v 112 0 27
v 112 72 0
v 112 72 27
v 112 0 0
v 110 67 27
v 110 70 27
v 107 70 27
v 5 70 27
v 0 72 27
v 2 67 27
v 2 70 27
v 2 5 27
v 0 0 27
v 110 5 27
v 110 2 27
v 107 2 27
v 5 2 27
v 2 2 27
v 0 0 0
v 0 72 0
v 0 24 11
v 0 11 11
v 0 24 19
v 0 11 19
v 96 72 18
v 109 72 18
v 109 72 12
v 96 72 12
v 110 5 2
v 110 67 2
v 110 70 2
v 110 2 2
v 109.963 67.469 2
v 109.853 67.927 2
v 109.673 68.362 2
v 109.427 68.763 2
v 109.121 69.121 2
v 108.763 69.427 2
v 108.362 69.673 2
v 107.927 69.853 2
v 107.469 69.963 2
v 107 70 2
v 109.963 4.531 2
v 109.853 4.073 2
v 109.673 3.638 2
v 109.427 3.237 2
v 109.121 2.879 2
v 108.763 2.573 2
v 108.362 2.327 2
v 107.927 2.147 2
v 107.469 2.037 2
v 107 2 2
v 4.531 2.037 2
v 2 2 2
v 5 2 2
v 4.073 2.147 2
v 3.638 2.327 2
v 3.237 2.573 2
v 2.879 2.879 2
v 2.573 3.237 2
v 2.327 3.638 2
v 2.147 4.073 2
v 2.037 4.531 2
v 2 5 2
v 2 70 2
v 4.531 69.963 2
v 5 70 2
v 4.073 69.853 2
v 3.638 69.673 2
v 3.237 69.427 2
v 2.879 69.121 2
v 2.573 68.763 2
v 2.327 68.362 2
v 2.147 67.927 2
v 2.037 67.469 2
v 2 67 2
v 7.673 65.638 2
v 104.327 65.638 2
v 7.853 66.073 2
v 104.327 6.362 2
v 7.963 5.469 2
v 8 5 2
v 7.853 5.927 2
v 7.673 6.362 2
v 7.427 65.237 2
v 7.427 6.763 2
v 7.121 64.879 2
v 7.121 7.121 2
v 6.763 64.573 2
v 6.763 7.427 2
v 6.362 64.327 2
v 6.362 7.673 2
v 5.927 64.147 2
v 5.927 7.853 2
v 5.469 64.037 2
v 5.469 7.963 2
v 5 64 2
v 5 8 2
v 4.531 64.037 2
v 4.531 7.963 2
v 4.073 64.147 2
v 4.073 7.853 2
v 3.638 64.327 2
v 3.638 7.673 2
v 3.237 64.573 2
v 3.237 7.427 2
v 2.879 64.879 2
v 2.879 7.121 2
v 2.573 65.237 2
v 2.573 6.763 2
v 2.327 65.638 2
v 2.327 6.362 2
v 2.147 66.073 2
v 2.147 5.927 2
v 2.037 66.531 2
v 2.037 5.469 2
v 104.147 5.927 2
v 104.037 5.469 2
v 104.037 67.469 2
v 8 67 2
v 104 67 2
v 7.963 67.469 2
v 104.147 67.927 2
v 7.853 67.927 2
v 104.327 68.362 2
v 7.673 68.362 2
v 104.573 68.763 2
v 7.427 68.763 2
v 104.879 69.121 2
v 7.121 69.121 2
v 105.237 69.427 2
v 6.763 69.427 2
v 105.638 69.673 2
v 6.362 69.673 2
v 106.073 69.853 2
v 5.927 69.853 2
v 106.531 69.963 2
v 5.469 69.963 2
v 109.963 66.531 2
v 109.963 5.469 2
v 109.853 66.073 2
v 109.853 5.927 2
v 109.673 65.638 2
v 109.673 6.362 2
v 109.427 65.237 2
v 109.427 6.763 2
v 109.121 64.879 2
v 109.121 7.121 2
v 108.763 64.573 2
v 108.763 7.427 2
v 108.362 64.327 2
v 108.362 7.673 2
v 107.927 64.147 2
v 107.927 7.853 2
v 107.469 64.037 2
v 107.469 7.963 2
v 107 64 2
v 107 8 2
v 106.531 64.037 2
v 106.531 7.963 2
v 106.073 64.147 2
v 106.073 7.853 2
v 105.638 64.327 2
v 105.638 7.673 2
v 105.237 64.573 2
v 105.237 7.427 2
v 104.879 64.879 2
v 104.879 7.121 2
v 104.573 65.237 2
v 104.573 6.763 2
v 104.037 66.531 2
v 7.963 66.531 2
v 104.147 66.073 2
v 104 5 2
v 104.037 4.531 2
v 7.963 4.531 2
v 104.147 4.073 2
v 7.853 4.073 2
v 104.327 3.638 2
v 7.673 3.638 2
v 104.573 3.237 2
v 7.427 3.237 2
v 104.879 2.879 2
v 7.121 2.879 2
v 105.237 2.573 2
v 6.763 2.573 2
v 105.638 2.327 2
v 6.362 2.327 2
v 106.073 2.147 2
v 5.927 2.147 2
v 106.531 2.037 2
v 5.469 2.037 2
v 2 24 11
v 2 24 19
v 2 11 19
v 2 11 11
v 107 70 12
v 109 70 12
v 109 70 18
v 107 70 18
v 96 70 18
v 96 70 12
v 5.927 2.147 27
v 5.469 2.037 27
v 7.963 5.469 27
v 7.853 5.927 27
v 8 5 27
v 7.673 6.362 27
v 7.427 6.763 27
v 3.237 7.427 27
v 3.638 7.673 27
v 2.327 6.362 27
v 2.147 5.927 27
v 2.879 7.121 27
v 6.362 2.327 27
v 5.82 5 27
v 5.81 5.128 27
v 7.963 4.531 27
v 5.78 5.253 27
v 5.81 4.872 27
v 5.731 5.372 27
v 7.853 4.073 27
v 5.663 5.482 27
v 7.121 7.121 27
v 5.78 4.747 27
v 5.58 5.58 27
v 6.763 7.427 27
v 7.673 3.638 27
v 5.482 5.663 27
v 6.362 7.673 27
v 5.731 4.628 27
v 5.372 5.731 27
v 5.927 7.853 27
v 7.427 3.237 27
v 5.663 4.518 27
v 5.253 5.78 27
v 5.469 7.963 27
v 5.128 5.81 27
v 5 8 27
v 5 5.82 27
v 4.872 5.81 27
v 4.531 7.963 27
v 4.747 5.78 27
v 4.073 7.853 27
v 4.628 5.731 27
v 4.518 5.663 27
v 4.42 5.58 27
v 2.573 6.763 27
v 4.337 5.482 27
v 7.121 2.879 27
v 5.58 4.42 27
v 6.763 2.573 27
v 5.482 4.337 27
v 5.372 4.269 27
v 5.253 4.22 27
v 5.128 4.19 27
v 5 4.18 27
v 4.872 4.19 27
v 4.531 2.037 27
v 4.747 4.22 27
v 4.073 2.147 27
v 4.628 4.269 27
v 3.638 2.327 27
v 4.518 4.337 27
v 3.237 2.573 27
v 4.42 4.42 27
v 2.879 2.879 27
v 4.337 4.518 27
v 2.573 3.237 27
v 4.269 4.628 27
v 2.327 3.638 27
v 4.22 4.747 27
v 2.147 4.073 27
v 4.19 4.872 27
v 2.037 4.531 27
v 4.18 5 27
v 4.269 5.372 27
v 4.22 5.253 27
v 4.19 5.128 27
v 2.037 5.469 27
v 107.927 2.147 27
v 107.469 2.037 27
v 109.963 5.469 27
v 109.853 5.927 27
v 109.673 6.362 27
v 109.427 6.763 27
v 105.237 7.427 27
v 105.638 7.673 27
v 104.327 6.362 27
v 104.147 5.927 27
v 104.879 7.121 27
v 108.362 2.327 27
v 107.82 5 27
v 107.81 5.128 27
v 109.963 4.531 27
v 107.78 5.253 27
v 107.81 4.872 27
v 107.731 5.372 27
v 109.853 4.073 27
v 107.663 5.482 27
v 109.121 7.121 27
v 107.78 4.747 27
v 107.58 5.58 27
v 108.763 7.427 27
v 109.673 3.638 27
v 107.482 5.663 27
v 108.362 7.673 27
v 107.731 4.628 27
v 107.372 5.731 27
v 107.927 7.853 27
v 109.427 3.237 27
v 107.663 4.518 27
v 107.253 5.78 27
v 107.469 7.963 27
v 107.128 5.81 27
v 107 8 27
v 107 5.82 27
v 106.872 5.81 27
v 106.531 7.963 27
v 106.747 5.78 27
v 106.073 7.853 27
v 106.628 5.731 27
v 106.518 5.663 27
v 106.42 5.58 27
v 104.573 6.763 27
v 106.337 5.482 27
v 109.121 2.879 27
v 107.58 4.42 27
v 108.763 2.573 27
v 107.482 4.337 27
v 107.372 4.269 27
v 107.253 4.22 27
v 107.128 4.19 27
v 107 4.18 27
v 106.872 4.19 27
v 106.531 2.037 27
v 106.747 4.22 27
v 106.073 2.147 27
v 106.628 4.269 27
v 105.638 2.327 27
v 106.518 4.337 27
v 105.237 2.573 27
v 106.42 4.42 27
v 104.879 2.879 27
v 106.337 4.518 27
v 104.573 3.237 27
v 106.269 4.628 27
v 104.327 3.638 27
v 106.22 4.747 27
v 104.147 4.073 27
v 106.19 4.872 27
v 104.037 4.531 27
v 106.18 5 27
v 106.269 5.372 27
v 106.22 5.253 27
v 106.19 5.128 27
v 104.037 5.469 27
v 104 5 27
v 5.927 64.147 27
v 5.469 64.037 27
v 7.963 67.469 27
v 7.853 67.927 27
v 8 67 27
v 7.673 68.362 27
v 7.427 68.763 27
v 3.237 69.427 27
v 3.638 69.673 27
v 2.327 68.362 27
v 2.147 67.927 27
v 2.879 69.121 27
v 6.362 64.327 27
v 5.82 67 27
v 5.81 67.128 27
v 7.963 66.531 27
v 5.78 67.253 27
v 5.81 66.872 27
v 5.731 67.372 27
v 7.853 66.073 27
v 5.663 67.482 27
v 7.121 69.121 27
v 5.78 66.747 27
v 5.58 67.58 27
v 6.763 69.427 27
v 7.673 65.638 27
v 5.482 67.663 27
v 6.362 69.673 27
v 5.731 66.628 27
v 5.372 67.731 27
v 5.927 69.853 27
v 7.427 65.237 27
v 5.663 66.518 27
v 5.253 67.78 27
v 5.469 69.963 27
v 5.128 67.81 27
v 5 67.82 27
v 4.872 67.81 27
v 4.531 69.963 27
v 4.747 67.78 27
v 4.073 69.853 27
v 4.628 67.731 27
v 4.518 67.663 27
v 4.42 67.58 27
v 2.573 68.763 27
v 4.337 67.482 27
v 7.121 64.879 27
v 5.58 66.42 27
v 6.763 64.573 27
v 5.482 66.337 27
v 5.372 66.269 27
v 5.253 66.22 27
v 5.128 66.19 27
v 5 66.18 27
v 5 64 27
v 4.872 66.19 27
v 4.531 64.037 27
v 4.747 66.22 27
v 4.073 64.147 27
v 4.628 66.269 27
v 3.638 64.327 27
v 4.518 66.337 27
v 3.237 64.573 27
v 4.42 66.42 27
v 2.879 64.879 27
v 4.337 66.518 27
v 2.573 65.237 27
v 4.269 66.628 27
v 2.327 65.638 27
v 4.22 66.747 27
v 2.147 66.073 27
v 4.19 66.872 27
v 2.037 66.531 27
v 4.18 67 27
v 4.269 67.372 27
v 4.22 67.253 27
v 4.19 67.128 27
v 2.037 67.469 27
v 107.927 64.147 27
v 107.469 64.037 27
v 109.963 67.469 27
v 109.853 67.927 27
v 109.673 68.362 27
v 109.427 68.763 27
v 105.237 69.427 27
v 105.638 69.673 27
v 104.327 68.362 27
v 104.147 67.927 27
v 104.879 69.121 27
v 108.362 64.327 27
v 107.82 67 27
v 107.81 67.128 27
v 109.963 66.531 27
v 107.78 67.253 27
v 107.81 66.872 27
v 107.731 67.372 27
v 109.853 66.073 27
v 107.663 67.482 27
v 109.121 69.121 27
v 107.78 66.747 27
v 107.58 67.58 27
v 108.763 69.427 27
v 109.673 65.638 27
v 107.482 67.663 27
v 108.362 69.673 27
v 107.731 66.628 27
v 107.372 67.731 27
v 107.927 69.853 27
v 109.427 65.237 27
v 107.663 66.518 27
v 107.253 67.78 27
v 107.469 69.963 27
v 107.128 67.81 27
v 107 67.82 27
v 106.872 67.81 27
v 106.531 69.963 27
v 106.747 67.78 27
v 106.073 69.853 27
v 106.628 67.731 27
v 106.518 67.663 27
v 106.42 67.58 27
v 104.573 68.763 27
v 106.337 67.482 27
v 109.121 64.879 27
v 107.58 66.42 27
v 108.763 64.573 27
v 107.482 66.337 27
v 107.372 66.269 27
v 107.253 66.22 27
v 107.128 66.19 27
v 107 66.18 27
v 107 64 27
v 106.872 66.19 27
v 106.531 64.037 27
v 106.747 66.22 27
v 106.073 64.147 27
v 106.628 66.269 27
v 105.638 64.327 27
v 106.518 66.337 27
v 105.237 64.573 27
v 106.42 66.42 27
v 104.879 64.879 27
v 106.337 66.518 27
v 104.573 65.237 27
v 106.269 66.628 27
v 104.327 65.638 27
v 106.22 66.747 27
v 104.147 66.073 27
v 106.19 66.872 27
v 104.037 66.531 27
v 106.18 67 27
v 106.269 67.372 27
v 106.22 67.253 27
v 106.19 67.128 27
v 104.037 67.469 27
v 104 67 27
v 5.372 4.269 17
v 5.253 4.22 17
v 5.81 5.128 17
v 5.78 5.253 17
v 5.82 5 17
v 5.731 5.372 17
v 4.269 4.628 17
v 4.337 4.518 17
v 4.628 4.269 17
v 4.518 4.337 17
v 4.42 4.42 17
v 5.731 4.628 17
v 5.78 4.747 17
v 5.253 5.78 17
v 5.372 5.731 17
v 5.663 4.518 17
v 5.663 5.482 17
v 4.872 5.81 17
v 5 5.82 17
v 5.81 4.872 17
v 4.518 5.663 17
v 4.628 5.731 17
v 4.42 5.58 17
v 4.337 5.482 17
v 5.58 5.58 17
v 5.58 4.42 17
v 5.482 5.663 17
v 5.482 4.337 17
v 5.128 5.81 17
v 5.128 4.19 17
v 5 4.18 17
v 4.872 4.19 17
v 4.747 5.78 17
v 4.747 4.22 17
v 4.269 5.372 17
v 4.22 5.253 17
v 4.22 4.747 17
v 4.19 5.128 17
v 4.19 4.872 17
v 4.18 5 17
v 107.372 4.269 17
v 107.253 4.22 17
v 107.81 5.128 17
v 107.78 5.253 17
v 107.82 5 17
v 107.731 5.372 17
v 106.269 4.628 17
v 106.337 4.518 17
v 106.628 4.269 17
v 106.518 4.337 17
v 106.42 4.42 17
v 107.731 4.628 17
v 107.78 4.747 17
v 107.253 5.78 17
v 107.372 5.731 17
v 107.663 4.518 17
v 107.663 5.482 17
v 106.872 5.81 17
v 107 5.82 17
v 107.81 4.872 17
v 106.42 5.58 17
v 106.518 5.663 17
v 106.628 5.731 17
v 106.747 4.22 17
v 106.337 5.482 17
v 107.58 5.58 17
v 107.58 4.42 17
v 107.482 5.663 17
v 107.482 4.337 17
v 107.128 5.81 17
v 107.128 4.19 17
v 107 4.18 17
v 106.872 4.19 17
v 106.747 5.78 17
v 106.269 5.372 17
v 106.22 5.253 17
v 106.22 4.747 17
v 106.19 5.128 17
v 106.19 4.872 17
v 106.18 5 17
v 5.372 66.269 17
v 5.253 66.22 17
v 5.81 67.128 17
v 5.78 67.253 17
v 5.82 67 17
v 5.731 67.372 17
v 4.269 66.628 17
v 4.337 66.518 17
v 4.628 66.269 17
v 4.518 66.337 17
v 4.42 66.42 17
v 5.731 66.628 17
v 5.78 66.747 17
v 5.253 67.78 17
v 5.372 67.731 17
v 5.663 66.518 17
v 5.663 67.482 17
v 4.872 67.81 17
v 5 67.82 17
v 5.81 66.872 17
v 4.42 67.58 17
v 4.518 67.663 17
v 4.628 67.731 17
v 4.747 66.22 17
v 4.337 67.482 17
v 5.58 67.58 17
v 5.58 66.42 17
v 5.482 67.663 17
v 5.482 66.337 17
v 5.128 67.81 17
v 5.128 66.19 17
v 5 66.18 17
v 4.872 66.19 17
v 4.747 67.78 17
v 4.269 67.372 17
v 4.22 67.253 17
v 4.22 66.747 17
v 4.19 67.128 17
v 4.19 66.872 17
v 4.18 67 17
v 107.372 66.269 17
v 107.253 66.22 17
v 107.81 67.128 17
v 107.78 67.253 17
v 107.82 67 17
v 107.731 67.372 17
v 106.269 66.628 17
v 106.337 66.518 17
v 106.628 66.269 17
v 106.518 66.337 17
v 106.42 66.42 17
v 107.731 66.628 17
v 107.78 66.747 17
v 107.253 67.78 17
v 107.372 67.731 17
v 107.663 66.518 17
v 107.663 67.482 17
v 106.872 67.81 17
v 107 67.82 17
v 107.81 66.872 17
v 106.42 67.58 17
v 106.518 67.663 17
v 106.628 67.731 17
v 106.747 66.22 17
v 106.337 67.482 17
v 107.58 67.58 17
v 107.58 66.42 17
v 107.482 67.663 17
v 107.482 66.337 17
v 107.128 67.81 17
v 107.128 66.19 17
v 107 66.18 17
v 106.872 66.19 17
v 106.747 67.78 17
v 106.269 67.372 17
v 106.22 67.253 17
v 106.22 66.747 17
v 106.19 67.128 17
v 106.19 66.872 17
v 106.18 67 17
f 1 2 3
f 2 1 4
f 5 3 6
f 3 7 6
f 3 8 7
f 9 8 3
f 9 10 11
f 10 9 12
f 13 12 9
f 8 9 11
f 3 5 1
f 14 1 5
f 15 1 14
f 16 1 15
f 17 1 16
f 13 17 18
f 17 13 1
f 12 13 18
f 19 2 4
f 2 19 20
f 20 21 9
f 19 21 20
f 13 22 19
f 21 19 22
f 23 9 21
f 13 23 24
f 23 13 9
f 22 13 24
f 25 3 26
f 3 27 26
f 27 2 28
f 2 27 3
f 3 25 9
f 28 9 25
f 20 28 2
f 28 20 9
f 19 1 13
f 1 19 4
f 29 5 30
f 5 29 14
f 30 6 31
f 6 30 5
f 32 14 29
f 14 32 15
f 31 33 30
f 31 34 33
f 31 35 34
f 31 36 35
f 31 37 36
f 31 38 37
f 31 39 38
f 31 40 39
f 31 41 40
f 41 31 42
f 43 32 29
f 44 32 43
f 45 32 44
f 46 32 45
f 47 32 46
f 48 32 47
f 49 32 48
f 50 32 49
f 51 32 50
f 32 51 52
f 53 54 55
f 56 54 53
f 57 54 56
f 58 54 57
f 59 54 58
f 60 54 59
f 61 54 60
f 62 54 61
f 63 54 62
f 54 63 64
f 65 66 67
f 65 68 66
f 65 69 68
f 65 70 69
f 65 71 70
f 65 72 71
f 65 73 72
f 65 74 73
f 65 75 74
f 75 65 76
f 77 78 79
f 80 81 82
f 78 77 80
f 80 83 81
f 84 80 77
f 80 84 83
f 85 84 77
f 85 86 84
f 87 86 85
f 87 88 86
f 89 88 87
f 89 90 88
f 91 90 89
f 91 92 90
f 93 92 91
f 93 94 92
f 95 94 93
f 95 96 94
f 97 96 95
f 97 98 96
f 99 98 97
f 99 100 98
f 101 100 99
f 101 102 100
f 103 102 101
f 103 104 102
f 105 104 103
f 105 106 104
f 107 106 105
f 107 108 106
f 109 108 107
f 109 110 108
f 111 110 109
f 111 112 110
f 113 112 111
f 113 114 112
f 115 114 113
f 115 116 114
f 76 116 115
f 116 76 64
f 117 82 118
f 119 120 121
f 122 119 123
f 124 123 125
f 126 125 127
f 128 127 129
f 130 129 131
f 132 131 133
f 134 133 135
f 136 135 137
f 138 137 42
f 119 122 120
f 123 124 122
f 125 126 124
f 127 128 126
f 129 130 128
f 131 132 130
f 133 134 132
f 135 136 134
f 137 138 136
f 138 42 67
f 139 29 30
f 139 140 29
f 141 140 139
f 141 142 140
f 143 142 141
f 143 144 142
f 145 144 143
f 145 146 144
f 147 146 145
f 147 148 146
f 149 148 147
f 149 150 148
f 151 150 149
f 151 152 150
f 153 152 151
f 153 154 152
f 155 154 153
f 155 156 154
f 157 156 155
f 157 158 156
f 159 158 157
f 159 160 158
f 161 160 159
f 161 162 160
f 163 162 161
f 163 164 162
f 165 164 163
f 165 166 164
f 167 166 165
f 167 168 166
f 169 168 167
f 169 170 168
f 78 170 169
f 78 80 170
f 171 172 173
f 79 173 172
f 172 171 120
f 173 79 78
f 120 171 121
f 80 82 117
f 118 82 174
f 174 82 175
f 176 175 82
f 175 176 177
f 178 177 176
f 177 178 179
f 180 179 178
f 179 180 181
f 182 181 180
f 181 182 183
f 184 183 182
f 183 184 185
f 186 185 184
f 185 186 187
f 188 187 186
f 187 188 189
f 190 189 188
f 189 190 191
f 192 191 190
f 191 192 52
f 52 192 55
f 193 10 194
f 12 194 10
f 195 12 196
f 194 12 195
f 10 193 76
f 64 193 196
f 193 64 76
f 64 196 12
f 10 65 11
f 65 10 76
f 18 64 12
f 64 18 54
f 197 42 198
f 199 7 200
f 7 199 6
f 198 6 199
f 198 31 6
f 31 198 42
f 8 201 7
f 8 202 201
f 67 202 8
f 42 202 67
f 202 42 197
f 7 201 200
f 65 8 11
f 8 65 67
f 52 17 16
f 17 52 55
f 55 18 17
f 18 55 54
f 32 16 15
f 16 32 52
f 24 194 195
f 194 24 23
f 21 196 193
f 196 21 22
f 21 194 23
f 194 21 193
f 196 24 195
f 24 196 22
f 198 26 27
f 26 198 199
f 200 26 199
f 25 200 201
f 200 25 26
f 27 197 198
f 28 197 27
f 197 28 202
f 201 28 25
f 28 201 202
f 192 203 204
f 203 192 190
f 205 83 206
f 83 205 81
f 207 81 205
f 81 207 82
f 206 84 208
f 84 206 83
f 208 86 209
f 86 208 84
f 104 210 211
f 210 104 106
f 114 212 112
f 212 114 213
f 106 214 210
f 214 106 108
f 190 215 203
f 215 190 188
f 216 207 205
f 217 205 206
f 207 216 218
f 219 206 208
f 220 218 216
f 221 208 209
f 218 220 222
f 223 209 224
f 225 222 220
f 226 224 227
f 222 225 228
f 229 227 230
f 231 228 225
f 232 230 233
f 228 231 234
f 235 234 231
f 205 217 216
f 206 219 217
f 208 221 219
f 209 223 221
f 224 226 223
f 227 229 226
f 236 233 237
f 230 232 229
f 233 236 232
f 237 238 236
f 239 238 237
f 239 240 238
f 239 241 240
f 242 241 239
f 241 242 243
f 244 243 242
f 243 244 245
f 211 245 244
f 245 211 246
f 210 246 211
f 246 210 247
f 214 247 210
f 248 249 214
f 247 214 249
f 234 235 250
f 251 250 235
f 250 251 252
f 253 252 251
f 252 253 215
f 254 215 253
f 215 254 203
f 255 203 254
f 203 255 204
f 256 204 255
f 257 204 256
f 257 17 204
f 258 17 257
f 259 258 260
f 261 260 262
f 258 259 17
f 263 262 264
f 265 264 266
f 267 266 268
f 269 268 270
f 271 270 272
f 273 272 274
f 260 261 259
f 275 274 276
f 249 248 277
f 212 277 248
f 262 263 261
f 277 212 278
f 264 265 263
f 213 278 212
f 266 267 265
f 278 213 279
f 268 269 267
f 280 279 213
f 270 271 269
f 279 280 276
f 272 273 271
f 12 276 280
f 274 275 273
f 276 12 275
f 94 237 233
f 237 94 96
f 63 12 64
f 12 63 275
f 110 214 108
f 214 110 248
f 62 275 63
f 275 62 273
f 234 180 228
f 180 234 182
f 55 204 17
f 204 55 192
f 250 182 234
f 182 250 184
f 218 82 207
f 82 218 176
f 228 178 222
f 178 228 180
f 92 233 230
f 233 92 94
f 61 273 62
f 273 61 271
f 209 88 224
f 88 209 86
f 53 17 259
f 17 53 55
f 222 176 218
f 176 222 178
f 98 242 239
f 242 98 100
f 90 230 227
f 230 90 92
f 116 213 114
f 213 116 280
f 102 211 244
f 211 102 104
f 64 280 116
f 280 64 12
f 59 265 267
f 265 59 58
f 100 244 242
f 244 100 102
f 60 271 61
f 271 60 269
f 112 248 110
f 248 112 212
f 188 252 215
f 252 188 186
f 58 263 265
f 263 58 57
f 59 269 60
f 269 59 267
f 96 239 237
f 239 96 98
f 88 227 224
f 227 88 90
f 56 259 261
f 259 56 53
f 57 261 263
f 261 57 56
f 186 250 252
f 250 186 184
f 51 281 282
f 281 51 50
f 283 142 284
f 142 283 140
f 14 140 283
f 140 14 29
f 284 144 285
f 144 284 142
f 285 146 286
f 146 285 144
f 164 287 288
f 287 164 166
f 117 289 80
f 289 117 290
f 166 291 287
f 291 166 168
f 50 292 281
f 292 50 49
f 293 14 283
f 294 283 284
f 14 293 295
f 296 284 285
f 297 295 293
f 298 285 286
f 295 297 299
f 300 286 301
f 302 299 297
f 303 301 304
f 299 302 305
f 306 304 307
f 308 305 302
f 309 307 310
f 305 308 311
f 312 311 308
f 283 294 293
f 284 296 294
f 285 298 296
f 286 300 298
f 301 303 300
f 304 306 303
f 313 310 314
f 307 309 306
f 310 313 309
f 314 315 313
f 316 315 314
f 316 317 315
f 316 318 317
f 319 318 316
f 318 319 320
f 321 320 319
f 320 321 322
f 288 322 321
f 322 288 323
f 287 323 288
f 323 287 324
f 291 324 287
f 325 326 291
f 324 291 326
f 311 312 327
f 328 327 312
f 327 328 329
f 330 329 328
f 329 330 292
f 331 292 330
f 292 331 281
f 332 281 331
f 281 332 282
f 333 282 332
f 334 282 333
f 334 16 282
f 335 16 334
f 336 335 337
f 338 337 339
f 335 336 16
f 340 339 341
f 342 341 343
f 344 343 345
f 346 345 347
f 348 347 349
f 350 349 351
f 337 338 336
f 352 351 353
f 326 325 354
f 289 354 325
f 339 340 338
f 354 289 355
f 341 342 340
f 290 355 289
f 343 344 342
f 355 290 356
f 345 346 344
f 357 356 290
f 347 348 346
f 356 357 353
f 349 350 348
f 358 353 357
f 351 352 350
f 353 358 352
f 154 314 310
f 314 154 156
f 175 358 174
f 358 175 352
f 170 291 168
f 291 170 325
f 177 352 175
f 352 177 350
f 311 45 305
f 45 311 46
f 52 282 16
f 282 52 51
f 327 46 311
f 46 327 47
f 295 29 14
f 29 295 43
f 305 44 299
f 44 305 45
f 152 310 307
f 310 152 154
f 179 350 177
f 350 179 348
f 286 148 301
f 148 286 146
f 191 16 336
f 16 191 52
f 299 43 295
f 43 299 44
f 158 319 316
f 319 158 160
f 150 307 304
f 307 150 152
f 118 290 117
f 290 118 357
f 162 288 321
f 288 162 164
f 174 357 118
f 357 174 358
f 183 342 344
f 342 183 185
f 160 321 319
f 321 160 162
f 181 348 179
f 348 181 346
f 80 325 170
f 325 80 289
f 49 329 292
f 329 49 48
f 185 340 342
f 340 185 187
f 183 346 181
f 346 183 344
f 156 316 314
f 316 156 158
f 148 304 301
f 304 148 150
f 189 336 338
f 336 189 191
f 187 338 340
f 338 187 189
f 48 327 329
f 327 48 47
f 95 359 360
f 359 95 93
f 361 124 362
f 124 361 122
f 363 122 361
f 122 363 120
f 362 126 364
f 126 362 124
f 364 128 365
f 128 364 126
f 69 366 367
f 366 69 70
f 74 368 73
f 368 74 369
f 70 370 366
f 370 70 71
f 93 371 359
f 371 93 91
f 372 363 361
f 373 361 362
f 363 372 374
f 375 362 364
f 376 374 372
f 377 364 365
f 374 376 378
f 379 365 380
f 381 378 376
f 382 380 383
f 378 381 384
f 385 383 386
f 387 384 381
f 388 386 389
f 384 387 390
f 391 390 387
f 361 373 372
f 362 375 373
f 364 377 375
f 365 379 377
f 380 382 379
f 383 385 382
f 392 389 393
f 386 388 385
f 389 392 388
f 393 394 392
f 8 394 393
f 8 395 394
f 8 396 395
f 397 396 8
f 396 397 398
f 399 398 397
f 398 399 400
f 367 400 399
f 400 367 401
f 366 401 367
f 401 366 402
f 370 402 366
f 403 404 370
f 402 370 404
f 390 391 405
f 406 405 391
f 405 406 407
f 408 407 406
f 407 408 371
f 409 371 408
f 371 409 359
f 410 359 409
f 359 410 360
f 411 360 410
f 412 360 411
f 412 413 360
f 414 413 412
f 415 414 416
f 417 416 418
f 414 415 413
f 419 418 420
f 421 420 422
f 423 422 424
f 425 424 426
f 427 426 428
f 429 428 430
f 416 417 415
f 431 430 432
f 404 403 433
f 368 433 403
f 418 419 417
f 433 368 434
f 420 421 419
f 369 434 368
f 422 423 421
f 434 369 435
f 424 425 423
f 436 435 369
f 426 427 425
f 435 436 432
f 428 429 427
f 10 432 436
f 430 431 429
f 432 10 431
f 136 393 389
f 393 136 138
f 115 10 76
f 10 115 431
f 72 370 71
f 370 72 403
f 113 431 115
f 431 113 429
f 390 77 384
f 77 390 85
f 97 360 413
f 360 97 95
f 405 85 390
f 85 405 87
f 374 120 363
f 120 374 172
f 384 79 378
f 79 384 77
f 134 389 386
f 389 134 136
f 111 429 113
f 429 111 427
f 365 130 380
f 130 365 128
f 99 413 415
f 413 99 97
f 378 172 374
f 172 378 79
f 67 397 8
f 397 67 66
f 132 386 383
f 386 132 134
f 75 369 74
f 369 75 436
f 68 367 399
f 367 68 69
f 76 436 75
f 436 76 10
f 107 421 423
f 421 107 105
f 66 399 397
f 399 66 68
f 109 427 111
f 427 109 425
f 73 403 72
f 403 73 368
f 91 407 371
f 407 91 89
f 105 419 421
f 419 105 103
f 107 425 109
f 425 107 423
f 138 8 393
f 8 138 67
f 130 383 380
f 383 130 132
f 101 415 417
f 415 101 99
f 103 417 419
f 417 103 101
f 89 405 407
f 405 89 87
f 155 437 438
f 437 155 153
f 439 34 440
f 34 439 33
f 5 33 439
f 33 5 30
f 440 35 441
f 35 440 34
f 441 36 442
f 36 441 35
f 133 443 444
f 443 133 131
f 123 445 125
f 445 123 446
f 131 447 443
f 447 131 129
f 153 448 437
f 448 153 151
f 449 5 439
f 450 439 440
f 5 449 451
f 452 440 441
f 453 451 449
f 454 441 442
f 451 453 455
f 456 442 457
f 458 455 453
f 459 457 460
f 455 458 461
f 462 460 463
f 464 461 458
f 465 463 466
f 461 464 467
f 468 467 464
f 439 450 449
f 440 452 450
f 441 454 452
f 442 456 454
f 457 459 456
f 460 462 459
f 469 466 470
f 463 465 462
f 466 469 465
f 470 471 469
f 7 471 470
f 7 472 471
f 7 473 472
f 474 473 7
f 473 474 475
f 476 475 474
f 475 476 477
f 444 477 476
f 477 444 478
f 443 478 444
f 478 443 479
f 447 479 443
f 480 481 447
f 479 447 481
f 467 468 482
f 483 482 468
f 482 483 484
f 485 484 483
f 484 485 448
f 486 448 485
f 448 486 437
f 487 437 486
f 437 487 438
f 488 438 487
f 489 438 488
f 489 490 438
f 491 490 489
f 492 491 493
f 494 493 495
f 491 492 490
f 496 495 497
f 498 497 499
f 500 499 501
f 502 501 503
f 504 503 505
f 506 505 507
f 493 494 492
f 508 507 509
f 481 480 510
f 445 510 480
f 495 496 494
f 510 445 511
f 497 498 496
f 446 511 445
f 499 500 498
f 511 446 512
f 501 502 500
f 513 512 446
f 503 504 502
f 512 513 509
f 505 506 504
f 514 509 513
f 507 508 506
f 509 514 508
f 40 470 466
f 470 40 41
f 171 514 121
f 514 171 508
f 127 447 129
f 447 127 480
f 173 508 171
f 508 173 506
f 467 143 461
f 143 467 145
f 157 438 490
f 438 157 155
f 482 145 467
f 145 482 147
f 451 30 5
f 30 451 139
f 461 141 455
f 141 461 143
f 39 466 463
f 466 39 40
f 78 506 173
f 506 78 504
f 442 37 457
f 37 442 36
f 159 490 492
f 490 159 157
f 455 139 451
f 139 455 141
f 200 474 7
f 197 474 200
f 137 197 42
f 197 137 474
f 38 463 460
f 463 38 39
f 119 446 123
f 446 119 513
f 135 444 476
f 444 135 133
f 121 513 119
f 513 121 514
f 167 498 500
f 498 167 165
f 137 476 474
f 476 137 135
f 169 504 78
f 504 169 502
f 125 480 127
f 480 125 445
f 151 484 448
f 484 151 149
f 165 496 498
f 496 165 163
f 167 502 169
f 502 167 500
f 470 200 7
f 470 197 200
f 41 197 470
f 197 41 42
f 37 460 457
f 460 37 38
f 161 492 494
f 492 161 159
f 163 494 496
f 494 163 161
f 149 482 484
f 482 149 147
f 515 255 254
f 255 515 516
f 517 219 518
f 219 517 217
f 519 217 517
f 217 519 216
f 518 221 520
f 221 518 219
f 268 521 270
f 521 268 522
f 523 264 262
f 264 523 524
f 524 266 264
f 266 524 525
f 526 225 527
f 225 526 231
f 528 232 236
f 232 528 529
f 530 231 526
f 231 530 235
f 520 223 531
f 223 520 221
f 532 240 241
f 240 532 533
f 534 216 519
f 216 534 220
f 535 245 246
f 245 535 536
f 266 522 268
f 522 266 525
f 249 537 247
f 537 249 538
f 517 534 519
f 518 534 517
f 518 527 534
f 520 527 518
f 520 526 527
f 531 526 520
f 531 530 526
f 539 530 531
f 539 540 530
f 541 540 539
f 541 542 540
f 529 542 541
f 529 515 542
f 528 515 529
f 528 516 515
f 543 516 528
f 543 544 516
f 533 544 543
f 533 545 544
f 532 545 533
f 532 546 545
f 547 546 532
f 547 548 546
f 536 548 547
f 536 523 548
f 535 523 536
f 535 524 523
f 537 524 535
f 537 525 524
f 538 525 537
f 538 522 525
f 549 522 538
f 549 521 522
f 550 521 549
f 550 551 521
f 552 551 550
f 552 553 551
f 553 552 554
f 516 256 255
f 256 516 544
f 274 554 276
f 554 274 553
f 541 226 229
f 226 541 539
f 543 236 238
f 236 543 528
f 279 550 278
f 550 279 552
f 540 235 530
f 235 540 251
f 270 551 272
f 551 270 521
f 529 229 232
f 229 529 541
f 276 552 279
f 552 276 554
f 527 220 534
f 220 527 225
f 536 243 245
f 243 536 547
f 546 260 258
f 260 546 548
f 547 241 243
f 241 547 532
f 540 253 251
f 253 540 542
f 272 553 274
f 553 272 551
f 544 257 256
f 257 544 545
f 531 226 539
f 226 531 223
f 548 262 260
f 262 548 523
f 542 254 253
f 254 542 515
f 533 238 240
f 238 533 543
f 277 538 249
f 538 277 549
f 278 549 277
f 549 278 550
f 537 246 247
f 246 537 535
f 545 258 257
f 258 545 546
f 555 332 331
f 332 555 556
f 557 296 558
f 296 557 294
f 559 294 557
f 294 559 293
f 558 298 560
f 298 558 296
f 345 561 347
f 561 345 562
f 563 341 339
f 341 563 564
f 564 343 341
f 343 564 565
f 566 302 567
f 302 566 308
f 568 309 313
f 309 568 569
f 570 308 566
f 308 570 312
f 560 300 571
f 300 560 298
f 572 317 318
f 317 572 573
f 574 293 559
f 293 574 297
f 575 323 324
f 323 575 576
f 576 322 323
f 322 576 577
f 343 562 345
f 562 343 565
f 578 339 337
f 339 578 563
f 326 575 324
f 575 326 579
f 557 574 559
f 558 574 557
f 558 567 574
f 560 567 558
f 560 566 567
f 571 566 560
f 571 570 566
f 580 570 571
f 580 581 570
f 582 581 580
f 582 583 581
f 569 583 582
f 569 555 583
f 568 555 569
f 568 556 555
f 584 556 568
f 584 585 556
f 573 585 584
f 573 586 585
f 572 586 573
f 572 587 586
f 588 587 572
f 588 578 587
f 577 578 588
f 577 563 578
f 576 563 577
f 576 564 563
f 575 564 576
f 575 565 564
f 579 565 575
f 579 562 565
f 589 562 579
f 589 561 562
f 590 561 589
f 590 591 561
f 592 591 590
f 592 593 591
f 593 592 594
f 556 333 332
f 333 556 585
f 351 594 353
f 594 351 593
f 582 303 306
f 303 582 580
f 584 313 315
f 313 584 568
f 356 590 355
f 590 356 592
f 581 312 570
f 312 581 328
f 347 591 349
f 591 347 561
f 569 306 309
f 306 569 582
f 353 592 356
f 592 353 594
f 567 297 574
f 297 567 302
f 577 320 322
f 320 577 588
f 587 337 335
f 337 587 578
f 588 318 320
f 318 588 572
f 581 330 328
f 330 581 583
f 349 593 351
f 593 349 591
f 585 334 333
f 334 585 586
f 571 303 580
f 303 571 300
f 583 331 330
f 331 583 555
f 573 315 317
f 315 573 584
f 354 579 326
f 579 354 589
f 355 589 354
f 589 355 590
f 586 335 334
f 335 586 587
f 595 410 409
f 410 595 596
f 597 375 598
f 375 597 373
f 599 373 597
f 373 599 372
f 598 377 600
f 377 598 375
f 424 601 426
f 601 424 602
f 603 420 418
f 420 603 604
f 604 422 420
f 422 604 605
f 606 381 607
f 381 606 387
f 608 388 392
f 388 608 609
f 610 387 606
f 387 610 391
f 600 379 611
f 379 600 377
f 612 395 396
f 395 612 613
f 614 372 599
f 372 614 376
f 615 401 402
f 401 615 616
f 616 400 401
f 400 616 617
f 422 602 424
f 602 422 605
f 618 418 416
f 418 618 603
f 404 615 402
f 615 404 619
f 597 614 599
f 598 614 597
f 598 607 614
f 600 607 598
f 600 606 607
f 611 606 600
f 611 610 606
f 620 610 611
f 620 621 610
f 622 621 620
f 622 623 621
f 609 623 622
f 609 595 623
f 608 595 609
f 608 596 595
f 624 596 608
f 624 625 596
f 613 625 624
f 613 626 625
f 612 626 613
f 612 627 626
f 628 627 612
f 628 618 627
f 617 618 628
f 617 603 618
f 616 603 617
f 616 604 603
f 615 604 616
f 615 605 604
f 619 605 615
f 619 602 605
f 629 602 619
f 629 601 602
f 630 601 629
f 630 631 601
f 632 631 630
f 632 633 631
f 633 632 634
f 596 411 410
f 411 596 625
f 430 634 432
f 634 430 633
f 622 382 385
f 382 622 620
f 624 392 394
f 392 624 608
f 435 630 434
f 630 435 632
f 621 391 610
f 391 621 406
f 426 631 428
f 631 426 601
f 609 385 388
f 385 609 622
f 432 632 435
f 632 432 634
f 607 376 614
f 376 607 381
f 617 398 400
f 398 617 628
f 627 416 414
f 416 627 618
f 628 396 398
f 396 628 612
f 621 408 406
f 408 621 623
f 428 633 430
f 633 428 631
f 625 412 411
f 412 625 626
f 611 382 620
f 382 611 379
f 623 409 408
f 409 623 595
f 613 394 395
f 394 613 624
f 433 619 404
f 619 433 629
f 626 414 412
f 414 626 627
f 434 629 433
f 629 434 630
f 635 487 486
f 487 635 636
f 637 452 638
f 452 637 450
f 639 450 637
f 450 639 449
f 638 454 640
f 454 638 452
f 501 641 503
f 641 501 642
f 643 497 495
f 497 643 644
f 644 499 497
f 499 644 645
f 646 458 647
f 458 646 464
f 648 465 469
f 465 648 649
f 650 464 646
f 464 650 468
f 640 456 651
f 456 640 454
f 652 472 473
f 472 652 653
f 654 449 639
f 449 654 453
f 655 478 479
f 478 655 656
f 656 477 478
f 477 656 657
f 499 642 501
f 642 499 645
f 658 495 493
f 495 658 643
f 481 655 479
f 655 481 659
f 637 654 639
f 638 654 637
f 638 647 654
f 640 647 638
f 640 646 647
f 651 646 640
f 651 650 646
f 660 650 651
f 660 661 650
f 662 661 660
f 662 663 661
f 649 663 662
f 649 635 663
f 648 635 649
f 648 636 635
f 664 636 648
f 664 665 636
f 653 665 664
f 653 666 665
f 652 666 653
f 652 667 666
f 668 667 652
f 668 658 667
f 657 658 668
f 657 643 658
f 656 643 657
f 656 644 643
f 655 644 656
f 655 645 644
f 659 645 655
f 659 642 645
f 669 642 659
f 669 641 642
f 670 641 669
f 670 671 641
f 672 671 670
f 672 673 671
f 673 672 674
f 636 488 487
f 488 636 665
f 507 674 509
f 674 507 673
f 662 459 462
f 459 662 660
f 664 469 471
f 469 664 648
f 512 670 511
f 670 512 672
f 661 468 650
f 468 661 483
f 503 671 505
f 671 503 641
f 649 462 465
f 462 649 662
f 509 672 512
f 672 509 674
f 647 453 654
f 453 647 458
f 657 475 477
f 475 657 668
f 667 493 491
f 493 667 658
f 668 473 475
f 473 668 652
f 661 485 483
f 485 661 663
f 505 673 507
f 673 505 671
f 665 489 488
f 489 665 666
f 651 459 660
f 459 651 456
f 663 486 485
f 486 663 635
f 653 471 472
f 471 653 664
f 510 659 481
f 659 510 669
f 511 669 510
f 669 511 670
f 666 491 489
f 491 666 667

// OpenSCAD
$fn=40;
part="base";
if(part=="base") difference(){union(){difference(){
translate([0, 0, 0]) cube([112, 72, 27]);
translate([2, 2, 2]) cube([108, 68, 26]);
translate([-1, 11, 11]) cube([4, 13, 8]);
translate([96, 69, 12]) cube([13, 4, 6]);
}
translate([5,5,0]) cylinder(h=27,r=3);
translate([107,5,0]) cylinder(h=27,r=3);
translate([5,67,0]) cylinder(h=27,r=3);
translate([107,67,0]) cylinder(h=27,r=3);
}
translate([5,5,17]) cylinder(h=11,r=0.82);
translate([107,5,17]) cylinder(h=11,r=0.82);
translate([5,67,17]) cylinder(h=11,r=0.82);
translate([107,67,17]) cylinder(h=11,r=0.82);
} else difference(){
translate([0, 0, 0]) cube([112, 72, 2]);
translate([82,17,-1]) cylinder(h=4,r=3.55);
translate([96,17,-1]) cylinder(h=4,r=3.55);
translate([79,43,-1]) cylinder(h=4,r=2.0);
translate([70,43,-1]) cylinder(h=4,r=2.5);
translate([5,5,-1]) cylinder(h=4,r=1.15);
translate([107,5,-1]) cylinder(h=4,r=1.15);
translate([5,67,-1]) cylinder(h=4,r=1.15);
translate([107,67,-1]) cylinder(h=4,r=1.15);
}
